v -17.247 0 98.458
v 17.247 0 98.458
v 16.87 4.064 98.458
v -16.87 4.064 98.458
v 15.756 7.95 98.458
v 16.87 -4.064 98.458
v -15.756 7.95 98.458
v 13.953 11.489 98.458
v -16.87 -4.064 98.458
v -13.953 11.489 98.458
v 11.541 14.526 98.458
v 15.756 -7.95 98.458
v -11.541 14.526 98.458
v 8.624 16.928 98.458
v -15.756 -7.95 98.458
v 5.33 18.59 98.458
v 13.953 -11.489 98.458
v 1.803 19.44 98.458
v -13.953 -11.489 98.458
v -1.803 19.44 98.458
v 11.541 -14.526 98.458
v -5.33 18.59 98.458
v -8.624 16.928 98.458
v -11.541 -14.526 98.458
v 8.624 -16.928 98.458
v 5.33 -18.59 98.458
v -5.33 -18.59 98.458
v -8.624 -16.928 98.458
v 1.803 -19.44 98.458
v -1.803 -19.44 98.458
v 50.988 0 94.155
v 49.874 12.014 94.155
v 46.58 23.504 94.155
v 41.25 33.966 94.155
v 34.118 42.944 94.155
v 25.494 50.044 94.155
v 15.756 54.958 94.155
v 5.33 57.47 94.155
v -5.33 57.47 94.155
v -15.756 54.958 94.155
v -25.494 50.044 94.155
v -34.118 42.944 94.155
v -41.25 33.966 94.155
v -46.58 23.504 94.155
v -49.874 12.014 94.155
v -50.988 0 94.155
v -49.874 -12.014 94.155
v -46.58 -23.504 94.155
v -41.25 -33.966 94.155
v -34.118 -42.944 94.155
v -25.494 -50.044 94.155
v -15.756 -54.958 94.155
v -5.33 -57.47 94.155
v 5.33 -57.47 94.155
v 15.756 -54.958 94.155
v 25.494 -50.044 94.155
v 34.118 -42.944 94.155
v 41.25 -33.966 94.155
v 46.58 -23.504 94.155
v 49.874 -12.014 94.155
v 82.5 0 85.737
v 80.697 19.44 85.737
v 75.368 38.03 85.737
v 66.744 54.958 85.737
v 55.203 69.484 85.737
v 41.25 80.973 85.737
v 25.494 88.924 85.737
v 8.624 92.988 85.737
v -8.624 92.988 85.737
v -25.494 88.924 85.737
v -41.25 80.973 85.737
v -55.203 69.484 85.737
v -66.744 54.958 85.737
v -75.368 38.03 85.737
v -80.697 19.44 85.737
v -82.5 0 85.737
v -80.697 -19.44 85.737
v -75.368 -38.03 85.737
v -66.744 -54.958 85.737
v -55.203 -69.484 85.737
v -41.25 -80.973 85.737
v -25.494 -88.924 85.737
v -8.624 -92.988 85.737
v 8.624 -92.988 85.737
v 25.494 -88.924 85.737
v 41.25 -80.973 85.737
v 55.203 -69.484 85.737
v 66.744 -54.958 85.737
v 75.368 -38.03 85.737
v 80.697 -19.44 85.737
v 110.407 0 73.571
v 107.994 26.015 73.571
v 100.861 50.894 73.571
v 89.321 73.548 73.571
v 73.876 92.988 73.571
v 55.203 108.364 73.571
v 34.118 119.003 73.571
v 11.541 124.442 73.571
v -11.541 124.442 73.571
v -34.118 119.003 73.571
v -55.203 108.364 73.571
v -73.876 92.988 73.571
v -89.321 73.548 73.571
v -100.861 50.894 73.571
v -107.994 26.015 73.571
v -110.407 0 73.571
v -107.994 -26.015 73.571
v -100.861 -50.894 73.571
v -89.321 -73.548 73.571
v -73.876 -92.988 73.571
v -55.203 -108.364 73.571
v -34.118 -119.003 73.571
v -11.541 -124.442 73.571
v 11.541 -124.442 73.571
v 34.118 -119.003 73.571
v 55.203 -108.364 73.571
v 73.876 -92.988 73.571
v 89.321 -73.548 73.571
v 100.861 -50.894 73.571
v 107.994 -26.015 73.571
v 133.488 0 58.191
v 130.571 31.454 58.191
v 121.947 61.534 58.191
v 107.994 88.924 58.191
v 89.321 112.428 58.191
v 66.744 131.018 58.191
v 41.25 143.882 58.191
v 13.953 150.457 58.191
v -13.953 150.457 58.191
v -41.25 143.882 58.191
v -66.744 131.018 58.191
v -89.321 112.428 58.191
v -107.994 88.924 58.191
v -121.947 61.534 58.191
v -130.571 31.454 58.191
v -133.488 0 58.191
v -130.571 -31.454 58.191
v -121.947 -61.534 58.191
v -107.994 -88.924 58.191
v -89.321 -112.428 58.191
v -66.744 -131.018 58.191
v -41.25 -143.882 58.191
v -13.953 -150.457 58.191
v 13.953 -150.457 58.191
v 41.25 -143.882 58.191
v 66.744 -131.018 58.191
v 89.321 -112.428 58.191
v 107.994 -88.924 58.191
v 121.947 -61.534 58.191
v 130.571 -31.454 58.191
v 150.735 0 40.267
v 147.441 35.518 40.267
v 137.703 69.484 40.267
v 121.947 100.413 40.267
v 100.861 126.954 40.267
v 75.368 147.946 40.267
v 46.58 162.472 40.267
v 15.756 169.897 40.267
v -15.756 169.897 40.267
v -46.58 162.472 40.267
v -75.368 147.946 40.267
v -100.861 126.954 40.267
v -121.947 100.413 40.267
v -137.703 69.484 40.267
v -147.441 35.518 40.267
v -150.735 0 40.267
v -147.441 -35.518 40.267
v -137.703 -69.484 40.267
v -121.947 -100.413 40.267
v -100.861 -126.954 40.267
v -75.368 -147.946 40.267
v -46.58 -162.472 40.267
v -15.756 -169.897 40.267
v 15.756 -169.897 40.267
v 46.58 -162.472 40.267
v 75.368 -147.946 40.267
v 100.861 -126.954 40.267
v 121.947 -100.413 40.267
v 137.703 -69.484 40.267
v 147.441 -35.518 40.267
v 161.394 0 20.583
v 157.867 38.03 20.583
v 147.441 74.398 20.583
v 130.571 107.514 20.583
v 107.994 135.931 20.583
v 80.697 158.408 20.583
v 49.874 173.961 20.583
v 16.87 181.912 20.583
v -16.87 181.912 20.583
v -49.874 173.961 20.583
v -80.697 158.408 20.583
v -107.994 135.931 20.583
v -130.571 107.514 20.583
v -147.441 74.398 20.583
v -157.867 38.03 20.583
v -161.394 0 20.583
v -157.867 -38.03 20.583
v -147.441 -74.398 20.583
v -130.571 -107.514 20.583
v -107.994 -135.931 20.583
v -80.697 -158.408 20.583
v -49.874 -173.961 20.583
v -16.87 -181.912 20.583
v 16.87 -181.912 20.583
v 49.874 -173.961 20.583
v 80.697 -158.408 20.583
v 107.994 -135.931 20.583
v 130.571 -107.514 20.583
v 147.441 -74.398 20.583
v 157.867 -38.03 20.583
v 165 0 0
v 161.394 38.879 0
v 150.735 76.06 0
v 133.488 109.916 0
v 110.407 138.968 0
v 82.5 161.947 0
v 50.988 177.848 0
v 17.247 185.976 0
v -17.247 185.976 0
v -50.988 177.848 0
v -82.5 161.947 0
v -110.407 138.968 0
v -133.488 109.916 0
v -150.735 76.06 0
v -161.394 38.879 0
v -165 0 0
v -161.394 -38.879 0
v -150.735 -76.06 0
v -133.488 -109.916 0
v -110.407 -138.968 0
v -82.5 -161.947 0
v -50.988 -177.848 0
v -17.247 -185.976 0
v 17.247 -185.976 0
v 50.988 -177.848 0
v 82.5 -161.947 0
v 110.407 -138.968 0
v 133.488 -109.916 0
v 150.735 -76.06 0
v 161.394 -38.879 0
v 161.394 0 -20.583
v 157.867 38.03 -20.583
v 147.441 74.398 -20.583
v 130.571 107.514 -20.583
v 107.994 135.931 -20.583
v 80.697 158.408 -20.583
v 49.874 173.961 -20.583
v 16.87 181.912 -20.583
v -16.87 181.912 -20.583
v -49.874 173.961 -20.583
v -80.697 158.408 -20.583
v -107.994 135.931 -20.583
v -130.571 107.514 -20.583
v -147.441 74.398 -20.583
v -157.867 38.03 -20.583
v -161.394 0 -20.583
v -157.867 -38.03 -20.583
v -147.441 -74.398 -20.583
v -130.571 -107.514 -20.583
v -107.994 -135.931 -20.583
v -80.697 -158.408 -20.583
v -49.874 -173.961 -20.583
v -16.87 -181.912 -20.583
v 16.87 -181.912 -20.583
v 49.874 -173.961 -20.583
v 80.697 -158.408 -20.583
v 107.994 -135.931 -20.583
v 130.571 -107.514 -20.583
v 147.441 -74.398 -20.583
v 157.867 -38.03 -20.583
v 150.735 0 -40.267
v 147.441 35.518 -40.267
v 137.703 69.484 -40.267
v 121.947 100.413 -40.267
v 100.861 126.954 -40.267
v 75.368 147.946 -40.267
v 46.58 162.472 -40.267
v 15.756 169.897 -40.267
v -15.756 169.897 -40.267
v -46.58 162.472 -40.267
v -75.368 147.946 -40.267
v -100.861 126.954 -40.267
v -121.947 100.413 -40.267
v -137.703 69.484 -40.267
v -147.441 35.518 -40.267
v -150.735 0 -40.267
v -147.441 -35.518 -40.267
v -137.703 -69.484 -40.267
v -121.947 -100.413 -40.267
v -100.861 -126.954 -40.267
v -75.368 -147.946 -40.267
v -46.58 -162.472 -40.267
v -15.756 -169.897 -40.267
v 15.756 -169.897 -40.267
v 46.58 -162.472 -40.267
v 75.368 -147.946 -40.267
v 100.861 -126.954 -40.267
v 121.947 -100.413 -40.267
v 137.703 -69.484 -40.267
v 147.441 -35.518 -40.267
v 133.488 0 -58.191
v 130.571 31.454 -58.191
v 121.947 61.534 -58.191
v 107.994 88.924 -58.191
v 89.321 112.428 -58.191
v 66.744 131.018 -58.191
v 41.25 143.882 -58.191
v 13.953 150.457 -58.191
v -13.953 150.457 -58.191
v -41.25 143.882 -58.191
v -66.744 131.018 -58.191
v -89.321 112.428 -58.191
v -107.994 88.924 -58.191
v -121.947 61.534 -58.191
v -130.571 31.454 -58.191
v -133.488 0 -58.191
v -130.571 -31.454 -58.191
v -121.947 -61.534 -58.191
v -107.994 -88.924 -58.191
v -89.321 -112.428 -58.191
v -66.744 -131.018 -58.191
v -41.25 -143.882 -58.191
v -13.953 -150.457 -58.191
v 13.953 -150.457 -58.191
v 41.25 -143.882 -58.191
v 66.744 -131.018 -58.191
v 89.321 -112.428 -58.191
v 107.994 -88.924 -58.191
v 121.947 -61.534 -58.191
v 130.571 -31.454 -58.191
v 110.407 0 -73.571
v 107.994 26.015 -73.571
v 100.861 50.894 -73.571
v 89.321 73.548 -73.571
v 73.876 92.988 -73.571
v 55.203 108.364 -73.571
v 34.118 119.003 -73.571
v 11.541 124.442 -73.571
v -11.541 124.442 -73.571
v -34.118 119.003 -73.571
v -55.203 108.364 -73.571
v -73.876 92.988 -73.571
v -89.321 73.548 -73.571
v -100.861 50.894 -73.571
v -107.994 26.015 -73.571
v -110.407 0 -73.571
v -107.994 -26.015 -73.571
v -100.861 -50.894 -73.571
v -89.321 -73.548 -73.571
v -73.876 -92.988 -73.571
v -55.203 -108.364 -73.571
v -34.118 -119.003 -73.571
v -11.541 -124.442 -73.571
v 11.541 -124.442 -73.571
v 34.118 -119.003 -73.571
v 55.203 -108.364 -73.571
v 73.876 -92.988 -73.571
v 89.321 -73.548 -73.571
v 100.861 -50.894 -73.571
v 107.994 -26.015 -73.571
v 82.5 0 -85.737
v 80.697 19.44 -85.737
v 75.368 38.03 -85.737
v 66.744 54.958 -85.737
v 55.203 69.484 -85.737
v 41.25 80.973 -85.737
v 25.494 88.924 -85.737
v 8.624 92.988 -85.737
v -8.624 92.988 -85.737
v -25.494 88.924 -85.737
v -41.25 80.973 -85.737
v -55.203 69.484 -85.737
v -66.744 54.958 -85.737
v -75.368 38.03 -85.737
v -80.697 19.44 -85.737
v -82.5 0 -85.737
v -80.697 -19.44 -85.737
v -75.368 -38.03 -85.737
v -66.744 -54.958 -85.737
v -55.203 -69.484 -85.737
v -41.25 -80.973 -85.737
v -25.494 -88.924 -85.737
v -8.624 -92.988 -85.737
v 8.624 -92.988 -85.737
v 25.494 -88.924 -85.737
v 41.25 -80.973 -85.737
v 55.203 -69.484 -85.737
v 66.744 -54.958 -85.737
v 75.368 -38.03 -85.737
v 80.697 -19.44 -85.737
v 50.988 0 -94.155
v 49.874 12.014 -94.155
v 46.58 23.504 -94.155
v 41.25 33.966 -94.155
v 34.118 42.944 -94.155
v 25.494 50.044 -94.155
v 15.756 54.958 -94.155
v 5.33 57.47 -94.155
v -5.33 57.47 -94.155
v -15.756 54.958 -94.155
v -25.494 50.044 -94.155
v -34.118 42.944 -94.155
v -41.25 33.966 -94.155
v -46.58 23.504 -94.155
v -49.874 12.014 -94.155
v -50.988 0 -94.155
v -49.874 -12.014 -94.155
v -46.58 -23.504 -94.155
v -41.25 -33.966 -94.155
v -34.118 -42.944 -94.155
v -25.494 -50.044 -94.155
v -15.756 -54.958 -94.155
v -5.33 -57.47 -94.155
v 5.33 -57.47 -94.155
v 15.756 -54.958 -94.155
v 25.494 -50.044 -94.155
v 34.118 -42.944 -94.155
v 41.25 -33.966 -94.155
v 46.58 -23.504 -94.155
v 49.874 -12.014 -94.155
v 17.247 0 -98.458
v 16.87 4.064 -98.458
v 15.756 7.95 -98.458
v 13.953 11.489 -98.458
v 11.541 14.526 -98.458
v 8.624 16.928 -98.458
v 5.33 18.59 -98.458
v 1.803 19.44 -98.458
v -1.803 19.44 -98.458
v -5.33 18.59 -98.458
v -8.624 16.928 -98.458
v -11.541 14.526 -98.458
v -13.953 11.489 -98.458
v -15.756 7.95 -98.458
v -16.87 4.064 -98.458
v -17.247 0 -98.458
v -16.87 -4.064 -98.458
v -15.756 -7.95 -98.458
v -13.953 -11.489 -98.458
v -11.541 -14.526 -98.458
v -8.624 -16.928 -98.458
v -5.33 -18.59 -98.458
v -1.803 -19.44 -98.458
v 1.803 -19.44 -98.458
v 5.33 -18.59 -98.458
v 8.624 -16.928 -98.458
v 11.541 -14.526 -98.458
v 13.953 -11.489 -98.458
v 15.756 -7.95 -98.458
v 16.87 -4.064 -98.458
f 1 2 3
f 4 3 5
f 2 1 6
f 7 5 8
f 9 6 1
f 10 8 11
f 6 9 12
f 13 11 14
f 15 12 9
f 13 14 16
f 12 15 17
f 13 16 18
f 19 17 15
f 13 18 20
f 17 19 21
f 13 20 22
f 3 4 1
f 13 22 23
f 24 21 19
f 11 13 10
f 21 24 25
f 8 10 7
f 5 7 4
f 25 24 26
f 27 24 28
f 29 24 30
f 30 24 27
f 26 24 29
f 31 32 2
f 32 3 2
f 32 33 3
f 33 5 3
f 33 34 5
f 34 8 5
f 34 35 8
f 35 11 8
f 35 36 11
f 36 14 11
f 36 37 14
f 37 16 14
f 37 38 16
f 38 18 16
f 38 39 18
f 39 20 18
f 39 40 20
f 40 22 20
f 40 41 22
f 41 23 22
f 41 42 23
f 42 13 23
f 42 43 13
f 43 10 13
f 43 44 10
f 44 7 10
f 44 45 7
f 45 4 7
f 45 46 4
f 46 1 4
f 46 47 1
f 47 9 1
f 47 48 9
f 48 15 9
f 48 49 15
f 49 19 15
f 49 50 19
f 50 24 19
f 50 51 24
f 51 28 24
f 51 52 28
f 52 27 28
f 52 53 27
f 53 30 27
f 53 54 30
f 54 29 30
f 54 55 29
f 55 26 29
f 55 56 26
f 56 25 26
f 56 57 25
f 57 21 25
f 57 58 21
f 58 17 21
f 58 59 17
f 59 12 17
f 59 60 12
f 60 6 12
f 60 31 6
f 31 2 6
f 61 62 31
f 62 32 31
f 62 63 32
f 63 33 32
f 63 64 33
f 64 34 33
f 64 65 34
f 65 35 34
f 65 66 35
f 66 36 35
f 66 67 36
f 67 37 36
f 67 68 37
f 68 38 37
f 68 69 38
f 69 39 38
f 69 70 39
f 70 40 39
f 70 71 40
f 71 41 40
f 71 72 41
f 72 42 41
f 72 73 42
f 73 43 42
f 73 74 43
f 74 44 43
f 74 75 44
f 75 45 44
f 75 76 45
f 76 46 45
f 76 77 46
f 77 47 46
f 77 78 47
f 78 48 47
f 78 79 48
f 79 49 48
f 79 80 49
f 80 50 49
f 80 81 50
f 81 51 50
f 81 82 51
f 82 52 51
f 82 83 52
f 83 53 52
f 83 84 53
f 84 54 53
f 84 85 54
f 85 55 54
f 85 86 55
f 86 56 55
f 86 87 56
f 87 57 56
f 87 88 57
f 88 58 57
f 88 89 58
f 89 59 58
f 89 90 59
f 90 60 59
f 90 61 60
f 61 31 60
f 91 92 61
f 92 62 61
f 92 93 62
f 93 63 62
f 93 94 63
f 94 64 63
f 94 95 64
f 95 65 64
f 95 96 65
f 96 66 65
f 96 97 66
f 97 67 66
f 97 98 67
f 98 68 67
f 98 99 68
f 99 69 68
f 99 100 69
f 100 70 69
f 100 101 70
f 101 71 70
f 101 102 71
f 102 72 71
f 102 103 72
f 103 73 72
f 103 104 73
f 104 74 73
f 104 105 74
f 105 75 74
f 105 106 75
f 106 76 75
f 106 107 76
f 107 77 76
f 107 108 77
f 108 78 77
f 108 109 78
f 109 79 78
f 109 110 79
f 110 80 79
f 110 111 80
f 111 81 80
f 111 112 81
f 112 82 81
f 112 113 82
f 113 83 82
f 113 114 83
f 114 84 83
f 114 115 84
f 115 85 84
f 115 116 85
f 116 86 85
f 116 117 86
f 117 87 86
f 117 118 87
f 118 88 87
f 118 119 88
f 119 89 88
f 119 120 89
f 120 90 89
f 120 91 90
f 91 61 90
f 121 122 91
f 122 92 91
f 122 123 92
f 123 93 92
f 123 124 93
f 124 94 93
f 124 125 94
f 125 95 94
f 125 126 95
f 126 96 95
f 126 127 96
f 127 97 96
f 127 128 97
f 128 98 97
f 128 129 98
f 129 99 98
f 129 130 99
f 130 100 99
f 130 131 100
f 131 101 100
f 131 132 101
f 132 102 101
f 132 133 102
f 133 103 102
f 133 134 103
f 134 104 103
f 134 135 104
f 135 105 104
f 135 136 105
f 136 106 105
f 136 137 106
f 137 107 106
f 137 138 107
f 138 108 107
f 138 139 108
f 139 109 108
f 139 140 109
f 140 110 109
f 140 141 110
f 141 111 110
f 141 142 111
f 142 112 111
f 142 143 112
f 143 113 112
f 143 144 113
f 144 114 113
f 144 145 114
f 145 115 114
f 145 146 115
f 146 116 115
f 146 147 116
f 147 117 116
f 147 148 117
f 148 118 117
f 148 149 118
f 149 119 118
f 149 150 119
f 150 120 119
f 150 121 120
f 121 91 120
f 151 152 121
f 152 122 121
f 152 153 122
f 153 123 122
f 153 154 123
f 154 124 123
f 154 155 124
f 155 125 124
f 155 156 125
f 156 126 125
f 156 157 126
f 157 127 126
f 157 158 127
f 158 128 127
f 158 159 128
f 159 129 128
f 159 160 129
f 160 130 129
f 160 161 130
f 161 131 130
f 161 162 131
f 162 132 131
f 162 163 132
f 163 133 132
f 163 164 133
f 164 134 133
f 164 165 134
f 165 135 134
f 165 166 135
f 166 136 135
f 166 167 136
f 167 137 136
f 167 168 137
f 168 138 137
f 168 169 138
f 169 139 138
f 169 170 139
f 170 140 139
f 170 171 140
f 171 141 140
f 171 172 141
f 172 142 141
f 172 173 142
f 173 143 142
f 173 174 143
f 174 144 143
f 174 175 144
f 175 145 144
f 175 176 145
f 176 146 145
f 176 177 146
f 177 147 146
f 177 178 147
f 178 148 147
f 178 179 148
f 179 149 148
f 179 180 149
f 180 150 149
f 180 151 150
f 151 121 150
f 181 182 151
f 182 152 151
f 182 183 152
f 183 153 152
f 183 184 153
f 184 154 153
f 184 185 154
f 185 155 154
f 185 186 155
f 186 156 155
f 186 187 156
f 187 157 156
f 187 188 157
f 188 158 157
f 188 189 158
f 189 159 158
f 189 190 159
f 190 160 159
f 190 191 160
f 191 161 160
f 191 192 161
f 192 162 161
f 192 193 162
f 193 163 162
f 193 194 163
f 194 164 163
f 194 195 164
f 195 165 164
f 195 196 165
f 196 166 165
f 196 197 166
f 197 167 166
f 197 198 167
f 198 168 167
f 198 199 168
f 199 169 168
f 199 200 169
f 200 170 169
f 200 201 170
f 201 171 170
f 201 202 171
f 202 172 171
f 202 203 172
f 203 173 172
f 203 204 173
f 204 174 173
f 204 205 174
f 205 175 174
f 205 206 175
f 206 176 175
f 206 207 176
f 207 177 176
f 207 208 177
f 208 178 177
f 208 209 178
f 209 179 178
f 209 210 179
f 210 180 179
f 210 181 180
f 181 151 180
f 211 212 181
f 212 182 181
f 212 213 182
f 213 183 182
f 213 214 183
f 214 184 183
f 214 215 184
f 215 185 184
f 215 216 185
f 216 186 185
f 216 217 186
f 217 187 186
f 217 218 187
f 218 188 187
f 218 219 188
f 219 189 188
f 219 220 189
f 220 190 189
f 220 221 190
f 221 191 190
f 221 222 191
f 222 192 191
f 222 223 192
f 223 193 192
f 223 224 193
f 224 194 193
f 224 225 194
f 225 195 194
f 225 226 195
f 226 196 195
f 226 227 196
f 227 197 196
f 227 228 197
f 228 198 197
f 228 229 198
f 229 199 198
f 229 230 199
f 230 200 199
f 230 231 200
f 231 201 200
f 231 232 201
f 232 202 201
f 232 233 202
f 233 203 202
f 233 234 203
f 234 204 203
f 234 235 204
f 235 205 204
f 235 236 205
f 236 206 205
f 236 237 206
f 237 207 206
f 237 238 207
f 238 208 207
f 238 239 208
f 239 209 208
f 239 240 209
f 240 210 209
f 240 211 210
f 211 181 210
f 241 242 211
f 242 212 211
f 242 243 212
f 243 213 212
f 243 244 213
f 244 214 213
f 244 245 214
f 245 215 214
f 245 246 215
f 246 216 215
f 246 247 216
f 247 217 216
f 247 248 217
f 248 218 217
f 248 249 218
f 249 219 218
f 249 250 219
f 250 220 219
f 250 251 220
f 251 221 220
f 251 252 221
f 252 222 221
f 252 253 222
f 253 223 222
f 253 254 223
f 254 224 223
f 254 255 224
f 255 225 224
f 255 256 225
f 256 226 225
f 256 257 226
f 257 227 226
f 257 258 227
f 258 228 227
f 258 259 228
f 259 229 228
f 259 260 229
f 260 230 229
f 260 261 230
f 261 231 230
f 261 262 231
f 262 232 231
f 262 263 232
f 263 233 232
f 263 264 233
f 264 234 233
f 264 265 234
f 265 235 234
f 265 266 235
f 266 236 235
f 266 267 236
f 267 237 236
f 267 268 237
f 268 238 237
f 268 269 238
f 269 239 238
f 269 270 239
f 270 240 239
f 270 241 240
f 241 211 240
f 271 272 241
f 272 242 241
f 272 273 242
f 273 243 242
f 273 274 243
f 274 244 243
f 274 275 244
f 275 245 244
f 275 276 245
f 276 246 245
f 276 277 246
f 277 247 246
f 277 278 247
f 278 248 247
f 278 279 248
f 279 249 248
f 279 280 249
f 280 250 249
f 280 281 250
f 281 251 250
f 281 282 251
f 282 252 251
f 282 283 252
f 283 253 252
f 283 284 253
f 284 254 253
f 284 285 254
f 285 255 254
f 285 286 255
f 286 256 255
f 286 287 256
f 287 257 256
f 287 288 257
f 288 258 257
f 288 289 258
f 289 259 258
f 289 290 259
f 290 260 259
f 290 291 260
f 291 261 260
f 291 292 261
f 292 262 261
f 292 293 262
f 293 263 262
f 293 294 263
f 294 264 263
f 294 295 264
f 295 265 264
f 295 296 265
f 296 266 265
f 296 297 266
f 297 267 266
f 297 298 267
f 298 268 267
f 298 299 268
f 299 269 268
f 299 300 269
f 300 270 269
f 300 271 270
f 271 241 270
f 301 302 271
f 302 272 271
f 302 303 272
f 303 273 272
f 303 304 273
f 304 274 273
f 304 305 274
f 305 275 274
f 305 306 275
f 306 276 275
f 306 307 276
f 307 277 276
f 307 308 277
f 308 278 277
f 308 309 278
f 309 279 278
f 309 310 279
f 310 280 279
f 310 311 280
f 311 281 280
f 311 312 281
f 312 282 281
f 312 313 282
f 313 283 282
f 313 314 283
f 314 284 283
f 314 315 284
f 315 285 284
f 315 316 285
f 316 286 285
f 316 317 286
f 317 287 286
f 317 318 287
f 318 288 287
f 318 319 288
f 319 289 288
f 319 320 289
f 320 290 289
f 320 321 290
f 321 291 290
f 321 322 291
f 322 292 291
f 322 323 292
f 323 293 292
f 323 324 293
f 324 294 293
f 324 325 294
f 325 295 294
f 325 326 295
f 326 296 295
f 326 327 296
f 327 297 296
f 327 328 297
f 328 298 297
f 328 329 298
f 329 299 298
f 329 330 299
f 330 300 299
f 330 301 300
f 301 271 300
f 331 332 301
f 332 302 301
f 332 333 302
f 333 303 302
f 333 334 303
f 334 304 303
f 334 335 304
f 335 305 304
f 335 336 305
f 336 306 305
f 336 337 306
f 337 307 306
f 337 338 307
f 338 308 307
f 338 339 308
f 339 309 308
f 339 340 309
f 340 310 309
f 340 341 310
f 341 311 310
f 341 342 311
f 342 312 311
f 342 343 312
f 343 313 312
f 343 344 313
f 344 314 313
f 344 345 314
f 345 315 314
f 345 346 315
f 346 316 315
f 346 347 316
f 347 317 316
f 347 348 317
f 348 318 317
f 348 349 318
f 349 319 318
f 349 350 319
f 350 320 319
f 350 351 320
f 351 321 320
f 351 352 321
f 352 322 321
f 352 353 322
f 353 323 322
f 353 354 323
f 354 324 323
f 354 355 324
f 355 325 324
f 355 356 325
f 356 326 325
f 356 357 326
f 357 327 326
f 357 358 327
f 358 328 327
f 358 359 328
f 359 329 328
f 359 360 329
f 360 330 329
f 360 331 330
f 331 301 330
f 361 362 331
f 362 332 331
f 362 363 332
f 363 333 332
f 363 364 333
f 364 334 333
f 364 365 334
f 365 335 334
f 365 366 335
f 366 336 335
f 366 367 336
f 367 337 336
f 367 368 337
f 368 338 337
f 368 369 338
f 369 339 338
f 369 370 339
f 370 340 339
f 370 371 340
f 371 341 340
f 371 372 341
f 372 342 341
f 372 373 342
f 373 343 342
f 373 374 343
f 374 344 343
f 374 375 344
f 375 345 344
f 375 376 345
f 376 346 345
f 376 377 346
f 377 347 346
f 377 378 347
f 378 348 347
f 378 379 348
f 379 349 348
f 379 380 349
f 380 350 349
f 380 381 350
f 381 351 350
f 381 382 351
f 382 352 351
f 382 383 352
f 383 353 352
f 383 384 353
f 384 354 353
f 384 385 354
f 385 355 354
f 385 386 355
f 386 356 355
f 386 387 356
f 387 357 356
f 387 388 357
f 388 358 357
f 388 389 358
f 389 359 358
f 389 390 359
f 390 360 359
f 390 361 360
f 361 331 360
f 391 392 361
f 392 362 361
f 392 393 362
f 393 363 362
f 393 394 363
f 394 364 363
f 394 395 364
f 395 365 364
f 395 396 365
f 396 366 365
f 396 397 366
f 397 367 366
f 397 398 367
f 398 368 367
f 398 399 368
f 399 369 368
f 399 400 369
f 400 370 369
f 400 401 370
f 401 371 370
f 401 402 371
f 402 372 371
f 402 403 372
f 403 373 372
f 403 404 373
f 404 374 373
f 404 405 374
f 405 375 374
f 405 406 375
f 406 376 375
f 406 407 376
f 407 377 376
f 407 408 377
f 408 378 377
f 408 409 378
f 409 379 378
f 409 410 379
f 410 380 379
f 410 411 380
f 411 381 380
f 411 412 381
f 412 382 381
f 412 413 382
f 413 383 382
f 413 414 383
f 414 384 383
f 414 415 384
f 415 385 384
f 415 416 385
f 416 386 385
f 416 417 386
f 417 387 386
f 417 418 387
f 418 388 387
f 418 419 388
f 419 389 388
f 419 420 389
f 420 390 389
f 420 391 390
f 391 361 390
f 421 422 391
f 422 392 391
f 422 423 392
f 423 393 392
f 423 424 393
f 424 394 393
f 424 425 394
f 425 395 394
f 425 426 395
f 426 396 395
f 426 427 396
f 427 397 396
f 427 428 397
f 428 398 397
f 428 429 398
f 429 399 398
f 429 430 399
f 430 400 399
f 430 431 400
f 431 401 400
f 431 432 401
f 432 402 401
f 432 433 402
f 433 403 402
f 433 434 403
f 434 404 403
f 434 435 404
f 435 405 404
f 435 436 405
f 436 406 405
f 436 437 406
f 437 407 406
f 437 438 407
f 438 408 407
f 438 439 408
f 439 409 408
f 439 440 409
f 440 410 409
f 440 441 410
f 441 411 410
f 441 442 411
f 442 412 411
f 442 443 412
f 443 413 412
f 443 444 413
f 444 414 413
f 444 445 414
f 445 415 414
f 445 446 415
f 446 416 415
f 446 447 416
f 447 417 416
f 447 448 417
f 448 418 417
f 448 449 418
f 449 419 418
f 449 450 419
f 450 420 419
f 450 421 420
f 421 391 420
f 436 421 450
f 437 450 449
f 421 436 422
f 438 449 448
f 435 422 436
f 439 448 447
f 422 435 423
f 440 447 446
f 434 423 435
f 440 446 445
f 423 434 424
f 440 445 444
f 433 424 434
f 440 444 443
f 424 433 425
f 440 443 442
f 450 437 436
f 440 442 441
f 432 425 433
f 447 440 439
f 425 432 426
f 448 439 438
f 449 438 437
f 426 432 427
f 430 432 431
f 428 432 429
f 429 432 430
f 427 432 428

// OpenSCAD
// Generated by SolidPython 1.0.1 on 2020-07-29 00:46:52


scale(v = [15, 17, 9]) {
	sphere(r = 11);
}
/***********************************************
*********      SolidPython code:      **********
************************************************
 
# import packages: SolidPython
from solid import *
from solid.utils import *
from itertools import chain, combinations, permutations


class Resize:

    def __init__(self, scad_file):
        self.scad_file = scad_file
        #self.scad_file = import_scad(scad_file)
        # cone/cylinder param:
        self.r1 = 0
        self.r2 = 0
        self.h = 0
        # rectangular prism param:
        self.w = 0
        self.l = 0
        # ellipse param:
        self.r = 0

    # import OpenScad code (file name corresponds to shape)


    # classify shape + parameters
    def assign(self, param1, param2, param3):
        if self.scad_file == 'cone.scad':
            self.r1 = param1
            self.r2 = param2
            self.h = param3
        elif self.scad_file == 'cylinder.scad':
            self.r1 = param1
            self.r2 = param2
            self.h = param3
        elif self.scad_file == 'rectangularPrism.scad':
            self.h = param1
            self.l = param2
            self.w = param3
        else:
            self.r = param1
            self.h = param2

    # resize parameters
    def iterate(self):
        x = range(3, 20, 2)
        i = 1
        if self.scad_file == 'cone.scad':
            tempList = list(permutations(x, 2))
            for temp in tempList:
                param1 = temp[0]
                param2 = temp[1]
                filepath = 'produced_scad_files/' + 'cone' + str(param1) + '_' + str(param2) + '_' + '.scad'
                scad_render_to_file(cylinder(h=param1, r1=param2, r2=0), filepath)

        elif self.scad_file == 'cylinder.scad':
            tempList = list(permutations(x, 3))
            for temp in tempList:
                param1 = temp[0]
                param2 = temp[1]
                filepath = 'produced_scad_files/' + 'cylinder' + str(param1) + '_' + str(param2) + '_' + '.scad'
                scad_render_to_file(cylinder(h=param1, r1=param2, r2=param2), filepath)

        elif self.scad_file == 'rectangularPrism.scad':
            tempList = list(permutations(x, 3))
            for temp in tempList:
                param1 = temp[0]
                param2 = temp[1]
                param3 = temp[2]
                filepath = 'produced_scad_files/' + 'rectangularPrism' + str(param1) + '_' + str(param2) + '_' + str(
                    param3) + '.scad'
                scad_render_to_file(cube(size=(param1, param2, param3)), filepath)

        elif self.scad_file == 'ellipse.scad':
            tempList = list(permutations(x, 4))
            for temp in tempList:
                param1 = temp[0]
                param2 = temp[1]
                param3 = temp[2]
                param4 = temp[3]
                filepath = 'produced_scad_files/' + 'ellipse' + str(param1) + '_' + str(param2) + '_' + str(param3) + '_' + str(param4) + '.scad'
                scad_render_to_file(scale([param1, param2, param3])(sphere(r=param4)), filepath)

    def render_to_scadfile(self):
        scad_render_to_file(scad, 'example.scad') 
 
************************************************/
